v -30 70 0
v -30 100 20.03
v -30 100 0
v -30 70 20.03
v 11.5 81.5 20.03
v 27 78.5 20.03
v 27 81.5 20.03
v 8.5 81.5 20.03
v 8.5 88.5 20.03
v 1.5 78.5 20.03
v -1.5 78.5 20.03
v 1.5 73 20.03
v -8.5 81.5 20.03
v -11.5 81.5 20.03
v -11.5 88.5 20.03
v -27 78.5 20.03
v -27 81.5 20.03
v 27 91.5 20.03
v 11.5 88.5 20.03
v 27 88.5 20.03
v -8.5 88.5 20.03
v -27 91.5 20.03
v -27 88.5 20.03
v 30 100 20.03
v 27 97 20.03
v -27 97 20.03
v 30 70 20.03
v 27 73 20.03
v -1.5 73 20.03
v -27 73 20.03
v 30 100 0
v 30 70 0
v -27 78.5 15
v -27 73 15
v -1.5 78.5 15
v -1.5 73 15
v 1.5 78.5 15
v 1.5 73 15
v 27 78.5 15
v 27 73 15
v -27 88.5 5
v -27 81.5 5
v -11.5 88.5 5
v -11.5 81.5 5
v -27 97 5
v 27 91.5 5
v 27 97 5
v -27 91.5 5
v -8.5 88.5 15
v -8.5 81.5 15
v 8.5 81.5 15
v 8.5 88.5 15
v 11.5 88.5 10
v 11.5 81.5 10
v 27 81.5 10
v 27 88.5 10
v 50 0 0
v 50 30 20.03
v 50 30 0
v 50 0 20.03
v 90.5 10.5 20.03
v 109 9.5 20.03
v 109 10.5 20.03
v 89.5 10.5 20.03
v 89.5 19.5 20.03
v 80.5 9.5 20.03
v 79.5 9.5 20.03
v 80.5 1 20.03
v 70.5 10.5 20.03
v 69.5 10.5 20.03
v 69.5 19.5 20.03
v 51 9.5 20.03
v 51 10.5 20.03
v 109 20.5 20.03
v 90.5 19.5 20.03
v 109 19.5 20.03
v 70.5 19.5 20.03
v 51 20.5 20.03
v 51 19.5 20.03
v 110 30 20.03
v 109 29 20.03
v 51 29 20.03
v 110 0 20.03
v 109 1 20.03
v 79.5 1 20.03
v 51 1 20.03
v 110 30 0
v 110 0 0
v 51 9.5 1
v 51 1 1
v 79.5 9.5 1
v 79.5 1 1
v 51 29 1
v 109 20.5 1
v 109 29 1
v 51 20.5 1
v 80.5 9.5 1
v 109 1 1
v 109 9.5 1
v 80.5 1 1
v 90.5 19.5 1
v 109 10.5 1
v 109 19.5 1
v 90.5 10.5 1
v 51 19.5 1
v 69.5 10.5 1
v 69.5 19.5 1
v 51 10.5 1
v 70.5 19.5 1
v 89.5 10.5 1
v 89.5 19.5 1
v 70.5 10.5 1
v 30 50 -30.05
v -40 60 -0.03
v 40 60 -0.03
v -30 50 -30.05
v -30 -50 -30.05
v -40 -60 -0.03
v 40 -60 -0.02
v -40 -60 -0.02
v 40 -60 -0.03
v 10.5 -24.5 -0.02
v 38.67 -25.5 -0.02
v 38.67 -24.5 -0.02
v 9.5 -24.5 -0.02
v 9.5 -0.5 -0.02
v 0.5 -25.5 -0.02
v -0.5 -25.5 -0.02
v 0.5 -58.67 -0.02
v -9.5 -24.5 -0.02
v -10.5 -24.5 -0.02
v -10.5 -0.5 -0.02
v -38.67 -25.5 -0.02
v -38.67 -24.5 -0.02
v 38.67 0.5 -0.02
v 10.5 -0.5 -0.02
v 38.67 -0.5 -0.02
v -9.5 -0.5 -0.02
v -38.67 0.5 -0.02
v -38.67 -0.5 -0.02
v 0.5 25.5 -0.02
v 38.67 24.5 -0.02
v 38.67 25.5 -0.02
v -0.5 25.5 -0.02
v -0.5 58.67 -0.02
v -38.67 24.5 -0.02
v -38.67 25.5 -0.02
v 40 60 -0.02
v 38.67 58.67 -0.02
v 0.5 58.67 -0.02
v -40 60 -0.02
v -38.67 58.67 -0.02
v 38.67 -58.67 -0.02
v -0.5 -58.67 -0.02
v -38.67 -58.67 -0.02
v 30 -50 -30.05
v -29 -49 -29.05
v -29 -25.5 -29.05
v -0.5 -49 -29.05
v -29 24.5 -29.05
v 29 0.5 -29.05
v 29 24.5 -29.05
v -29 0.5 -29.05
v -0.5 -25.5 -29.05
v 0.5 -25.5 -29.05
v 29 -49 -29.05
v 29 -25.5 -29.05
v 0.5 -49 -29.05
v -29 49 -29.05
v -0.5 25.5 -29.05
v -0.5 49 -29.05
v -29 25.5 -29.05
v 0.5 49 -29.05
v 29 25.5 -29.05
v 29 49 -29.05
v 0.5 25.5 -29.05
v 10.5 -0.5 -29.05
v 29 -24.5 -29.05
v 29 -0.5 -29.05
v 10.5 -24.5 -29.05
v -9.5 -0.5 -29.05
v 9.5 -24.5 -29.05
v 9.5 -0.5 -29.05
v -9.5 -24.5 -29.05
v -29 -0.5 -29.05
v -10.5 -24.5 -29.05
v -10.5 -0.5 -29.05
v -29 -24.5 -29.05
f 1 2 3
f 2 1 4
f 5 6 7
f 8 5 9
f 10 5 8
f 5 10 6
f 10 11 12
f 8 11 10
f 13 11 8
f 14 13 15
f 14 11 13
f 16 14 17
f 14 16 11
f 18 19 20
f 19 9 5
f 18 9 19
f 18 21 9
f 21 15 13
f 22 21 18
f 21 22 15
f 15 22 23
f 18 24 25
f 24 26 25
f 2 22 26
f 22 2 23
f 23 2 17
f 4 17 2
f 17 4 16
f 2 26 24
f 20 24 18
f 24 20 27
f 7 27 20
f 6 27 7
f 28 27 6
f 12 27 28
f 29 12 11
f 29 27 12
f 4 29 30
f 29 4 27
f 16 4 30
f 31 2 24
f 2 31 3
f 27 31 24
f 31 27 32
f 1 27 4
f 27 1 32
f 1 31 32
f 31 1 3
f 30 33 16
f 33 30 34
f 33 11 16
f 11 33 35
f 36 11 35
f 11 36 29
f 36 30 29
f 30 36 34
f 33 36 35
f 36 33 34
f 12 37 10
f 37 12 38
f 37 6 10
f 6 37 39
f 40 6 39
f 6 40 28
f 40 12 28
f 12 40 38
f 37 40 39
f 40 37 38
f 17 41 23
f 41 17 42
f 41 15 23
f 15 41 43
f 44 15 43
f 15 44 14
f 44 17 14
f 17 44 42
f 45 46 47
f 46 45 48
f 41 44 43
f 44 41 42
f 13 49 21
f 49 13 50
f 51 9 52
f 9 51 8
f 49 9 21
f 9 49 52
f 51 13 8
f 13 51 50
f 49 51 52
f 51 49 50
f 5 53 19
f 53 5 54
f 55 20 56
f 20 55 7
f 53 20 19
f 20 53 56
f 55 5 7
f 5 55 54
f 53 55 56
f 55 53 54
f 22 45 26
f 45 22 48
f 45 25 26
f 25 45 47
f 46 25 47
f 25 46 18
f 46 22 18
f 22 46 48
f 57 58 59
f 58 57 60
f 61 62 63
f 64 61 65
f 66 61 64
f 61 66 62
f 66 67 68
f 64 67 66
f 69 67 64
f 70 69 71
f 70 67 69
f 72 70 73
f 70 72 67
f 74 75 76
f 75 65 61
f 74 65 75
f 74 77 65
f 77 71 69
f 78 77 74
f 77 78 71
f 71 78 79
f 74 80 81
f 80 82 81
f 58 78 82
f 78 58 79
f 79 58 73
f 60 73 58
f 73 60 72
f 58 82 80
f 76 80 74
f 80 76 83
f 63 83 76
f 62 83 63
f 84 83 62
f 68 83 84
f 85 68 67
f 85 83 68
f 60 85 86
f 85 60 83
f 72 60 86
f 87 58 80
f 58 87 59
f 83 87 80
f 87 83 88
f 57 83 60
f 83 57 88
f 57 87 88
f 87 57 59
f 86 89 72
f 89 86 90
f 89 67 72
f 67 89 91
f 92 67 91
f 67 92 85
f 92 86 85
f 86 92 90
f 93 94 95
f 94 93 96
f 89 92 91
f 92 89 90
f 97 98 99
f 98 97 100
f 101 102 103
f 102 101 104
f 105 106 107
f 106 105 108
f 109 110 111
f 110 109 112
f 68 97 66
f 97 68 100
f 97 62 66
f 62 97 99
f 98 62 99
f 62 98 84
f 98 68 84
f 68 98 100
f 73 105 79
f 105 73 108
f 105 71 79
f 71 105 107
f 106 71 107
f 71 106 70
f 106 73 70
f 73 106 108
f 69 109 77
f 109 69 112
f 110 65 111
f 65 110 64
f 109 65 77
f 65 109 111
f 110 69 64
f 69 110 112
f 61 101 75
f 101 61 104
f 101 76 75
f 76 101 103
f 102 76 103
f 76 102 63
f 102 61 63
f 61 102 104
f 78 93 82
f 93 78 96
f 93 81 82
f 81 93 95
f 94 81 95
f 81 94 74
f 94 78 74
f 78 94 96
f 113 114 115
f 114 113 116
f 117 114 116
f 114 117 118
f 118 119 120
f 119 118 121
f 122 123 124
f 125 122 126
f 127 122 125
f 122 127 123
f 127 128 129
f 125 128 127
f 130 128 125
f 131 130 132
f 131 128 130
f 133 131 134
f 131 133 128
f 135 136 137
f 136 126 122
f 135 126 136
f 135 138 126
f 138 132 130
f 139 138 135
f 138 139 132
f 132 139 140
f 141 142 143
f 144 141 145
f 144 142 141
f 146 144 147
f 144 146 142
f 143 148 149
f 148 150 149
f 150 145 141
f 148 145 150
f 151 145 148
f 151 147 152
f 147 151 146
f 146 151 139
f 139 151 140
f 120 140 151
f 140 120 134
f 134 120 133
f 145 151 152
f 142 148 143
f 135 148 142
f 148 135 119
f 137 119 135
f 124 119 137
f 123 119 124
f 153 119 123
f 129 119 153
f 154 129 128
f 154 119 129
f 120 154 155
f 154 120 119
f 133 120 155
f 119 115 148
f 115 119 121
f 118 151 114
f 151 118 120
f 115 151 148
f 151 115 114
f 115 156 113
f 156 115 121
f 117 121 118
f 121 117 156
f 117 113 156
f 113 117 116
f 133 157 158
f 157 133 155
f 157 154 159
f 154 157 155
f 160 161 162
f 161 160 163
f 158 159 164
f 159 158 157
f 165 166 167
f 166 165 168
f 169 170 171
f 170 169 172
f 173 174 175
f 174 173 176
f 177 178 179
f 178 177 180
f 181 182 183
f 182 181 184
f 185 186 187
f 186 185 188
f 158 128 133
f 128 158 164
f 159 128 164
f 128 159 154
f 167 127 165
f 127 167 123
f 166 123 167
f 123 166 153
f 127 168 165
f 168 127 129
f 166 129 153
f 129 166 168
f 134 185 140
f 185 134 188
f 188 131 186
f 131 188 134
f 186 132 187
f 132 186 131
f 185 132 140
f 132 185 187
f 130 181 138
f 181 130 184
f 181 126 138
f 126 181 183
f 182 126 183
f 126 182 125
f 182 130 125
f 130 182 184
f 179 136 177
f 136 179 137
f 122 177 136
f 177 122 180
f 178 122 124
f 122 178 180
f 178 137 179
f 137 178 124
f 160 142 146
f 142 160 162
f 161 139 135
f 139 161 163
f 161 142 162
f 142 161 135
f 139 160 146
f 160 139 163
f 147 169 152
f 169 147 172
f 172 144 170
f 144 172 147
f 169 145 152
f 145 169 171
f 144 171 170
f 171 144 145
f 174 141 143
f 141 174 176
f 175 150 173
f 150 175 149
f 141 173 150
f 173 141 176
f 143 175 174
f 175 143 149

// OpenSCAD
// file: caddy_organizer_divider_common.scad
overlap=0.01;

/*
 * separate h,w for top and bottom defines the taper
 * centering defines whether the extra on top or bottom extends fully in the positive direction,
 * or extends equally in both directions.
 * flip***Wise shifts the larger end (top or bottom) in the negative direction so it
 * doesn't need to be mirrored & shifted externally.
 * clipBottomHeight cuts off the lower part of the box up to the height specified
 */
module taperedBox(bw, tw, bl, tl, ht, centerWidthwise=true, centerLengthwise=true, 
        flipWidthwise=false, flipLengthwise=false,
        clipBottomHeight=0) {
    extraWidth = abs(tw-bw);
    extraLength = abs(tl-bl);
    widerWidth = max(tw,bw);
    longerLength = max(tl,bl);
    // Don't shift if not centered and not flipped.
    // When centered
    // When not centered and flipped, shift negative direction
    topWidthShift = ((centerWidthwise) ? -(extraWidth/2) : ((flipWidthwise) ? -extraWidth : 0));
    topLengthShift = ((centerLengthwise) ? -(extraLength/2) : ((flipLengthwise) ? -extraLength : 0));
    echo(str("topWidthShift=",topWidthShift,", topLengthShift=",topLengthShift));
    difference() {
        hull() {
            translate([0,0,0]) 
                cube([bw,bl,overlap]);
            translate([topWidthShift,topLengthShift,ht+overlap])
                cube([tw,tl,overlap]);
        }
        // clip off the bottom of the box (when used as a shallow cutout)        
        translate([-widerWidth/2,-longerLength,-overlap])
            cube([widerWidth*2,longerLength*2,clipBottomHeight+overlap]);
    }
}
// main file
use <caddy_organizer_divider.scad>

// test square sided more wide than long, thicker walls
// evenly split dividers
translate([-30,70,0])
caddyOrganizerDivider(bottomThickness=5, wallThickness=3, 
    bottomWidth=60, topWidth=60,
    bottomLength=30, topLength=30,
    wallHeight=20,
    crosswaysDividerOffsets=[0,10,20], // rows
    lengthwiseSplits=[[0,30],[0,20,40],[0]],  // row splits
    pocketDepths=[[10,10],[-1,10,15],[-1]]);  // how deep each pocket is

// test without pocket depths, but override to allFullDepth
// evenly split dividers
translate([50,0,0])
caddyOrganizerDivider(bottomThickness=1, wallThickness=1, 
    bottomWidth=60, topWidth=60,
    bottomLength=30, topLength=30,
    wallHeight=20,
    crosswaysDividerOffsets=[0,10,20], // rows
    lengthwiseSplits=[[0,30],[0,20,40],[0]],  // row splits
    allFullDepth=true);  // how deep each pocket is

// test exaggerated tapers
// moved below origin and centered to measure on grid marks
// 
translate([-30,-50,-30.05])
caddyOrganizerDivider(bottomThickness=1, wallThickness=1, 
    bottomWidth=60, topWidth=80,
    bottomLength=100, topLength=120,
    wallHeight=30,
    crosswaysDividerOffsets=[0,25,50,75], // rows
    lengthwiseSplits=[[0,30],[0,20,40],[0],[0,30]],  // row splits
    allFullDepth=true);  // how deep each pocket is
